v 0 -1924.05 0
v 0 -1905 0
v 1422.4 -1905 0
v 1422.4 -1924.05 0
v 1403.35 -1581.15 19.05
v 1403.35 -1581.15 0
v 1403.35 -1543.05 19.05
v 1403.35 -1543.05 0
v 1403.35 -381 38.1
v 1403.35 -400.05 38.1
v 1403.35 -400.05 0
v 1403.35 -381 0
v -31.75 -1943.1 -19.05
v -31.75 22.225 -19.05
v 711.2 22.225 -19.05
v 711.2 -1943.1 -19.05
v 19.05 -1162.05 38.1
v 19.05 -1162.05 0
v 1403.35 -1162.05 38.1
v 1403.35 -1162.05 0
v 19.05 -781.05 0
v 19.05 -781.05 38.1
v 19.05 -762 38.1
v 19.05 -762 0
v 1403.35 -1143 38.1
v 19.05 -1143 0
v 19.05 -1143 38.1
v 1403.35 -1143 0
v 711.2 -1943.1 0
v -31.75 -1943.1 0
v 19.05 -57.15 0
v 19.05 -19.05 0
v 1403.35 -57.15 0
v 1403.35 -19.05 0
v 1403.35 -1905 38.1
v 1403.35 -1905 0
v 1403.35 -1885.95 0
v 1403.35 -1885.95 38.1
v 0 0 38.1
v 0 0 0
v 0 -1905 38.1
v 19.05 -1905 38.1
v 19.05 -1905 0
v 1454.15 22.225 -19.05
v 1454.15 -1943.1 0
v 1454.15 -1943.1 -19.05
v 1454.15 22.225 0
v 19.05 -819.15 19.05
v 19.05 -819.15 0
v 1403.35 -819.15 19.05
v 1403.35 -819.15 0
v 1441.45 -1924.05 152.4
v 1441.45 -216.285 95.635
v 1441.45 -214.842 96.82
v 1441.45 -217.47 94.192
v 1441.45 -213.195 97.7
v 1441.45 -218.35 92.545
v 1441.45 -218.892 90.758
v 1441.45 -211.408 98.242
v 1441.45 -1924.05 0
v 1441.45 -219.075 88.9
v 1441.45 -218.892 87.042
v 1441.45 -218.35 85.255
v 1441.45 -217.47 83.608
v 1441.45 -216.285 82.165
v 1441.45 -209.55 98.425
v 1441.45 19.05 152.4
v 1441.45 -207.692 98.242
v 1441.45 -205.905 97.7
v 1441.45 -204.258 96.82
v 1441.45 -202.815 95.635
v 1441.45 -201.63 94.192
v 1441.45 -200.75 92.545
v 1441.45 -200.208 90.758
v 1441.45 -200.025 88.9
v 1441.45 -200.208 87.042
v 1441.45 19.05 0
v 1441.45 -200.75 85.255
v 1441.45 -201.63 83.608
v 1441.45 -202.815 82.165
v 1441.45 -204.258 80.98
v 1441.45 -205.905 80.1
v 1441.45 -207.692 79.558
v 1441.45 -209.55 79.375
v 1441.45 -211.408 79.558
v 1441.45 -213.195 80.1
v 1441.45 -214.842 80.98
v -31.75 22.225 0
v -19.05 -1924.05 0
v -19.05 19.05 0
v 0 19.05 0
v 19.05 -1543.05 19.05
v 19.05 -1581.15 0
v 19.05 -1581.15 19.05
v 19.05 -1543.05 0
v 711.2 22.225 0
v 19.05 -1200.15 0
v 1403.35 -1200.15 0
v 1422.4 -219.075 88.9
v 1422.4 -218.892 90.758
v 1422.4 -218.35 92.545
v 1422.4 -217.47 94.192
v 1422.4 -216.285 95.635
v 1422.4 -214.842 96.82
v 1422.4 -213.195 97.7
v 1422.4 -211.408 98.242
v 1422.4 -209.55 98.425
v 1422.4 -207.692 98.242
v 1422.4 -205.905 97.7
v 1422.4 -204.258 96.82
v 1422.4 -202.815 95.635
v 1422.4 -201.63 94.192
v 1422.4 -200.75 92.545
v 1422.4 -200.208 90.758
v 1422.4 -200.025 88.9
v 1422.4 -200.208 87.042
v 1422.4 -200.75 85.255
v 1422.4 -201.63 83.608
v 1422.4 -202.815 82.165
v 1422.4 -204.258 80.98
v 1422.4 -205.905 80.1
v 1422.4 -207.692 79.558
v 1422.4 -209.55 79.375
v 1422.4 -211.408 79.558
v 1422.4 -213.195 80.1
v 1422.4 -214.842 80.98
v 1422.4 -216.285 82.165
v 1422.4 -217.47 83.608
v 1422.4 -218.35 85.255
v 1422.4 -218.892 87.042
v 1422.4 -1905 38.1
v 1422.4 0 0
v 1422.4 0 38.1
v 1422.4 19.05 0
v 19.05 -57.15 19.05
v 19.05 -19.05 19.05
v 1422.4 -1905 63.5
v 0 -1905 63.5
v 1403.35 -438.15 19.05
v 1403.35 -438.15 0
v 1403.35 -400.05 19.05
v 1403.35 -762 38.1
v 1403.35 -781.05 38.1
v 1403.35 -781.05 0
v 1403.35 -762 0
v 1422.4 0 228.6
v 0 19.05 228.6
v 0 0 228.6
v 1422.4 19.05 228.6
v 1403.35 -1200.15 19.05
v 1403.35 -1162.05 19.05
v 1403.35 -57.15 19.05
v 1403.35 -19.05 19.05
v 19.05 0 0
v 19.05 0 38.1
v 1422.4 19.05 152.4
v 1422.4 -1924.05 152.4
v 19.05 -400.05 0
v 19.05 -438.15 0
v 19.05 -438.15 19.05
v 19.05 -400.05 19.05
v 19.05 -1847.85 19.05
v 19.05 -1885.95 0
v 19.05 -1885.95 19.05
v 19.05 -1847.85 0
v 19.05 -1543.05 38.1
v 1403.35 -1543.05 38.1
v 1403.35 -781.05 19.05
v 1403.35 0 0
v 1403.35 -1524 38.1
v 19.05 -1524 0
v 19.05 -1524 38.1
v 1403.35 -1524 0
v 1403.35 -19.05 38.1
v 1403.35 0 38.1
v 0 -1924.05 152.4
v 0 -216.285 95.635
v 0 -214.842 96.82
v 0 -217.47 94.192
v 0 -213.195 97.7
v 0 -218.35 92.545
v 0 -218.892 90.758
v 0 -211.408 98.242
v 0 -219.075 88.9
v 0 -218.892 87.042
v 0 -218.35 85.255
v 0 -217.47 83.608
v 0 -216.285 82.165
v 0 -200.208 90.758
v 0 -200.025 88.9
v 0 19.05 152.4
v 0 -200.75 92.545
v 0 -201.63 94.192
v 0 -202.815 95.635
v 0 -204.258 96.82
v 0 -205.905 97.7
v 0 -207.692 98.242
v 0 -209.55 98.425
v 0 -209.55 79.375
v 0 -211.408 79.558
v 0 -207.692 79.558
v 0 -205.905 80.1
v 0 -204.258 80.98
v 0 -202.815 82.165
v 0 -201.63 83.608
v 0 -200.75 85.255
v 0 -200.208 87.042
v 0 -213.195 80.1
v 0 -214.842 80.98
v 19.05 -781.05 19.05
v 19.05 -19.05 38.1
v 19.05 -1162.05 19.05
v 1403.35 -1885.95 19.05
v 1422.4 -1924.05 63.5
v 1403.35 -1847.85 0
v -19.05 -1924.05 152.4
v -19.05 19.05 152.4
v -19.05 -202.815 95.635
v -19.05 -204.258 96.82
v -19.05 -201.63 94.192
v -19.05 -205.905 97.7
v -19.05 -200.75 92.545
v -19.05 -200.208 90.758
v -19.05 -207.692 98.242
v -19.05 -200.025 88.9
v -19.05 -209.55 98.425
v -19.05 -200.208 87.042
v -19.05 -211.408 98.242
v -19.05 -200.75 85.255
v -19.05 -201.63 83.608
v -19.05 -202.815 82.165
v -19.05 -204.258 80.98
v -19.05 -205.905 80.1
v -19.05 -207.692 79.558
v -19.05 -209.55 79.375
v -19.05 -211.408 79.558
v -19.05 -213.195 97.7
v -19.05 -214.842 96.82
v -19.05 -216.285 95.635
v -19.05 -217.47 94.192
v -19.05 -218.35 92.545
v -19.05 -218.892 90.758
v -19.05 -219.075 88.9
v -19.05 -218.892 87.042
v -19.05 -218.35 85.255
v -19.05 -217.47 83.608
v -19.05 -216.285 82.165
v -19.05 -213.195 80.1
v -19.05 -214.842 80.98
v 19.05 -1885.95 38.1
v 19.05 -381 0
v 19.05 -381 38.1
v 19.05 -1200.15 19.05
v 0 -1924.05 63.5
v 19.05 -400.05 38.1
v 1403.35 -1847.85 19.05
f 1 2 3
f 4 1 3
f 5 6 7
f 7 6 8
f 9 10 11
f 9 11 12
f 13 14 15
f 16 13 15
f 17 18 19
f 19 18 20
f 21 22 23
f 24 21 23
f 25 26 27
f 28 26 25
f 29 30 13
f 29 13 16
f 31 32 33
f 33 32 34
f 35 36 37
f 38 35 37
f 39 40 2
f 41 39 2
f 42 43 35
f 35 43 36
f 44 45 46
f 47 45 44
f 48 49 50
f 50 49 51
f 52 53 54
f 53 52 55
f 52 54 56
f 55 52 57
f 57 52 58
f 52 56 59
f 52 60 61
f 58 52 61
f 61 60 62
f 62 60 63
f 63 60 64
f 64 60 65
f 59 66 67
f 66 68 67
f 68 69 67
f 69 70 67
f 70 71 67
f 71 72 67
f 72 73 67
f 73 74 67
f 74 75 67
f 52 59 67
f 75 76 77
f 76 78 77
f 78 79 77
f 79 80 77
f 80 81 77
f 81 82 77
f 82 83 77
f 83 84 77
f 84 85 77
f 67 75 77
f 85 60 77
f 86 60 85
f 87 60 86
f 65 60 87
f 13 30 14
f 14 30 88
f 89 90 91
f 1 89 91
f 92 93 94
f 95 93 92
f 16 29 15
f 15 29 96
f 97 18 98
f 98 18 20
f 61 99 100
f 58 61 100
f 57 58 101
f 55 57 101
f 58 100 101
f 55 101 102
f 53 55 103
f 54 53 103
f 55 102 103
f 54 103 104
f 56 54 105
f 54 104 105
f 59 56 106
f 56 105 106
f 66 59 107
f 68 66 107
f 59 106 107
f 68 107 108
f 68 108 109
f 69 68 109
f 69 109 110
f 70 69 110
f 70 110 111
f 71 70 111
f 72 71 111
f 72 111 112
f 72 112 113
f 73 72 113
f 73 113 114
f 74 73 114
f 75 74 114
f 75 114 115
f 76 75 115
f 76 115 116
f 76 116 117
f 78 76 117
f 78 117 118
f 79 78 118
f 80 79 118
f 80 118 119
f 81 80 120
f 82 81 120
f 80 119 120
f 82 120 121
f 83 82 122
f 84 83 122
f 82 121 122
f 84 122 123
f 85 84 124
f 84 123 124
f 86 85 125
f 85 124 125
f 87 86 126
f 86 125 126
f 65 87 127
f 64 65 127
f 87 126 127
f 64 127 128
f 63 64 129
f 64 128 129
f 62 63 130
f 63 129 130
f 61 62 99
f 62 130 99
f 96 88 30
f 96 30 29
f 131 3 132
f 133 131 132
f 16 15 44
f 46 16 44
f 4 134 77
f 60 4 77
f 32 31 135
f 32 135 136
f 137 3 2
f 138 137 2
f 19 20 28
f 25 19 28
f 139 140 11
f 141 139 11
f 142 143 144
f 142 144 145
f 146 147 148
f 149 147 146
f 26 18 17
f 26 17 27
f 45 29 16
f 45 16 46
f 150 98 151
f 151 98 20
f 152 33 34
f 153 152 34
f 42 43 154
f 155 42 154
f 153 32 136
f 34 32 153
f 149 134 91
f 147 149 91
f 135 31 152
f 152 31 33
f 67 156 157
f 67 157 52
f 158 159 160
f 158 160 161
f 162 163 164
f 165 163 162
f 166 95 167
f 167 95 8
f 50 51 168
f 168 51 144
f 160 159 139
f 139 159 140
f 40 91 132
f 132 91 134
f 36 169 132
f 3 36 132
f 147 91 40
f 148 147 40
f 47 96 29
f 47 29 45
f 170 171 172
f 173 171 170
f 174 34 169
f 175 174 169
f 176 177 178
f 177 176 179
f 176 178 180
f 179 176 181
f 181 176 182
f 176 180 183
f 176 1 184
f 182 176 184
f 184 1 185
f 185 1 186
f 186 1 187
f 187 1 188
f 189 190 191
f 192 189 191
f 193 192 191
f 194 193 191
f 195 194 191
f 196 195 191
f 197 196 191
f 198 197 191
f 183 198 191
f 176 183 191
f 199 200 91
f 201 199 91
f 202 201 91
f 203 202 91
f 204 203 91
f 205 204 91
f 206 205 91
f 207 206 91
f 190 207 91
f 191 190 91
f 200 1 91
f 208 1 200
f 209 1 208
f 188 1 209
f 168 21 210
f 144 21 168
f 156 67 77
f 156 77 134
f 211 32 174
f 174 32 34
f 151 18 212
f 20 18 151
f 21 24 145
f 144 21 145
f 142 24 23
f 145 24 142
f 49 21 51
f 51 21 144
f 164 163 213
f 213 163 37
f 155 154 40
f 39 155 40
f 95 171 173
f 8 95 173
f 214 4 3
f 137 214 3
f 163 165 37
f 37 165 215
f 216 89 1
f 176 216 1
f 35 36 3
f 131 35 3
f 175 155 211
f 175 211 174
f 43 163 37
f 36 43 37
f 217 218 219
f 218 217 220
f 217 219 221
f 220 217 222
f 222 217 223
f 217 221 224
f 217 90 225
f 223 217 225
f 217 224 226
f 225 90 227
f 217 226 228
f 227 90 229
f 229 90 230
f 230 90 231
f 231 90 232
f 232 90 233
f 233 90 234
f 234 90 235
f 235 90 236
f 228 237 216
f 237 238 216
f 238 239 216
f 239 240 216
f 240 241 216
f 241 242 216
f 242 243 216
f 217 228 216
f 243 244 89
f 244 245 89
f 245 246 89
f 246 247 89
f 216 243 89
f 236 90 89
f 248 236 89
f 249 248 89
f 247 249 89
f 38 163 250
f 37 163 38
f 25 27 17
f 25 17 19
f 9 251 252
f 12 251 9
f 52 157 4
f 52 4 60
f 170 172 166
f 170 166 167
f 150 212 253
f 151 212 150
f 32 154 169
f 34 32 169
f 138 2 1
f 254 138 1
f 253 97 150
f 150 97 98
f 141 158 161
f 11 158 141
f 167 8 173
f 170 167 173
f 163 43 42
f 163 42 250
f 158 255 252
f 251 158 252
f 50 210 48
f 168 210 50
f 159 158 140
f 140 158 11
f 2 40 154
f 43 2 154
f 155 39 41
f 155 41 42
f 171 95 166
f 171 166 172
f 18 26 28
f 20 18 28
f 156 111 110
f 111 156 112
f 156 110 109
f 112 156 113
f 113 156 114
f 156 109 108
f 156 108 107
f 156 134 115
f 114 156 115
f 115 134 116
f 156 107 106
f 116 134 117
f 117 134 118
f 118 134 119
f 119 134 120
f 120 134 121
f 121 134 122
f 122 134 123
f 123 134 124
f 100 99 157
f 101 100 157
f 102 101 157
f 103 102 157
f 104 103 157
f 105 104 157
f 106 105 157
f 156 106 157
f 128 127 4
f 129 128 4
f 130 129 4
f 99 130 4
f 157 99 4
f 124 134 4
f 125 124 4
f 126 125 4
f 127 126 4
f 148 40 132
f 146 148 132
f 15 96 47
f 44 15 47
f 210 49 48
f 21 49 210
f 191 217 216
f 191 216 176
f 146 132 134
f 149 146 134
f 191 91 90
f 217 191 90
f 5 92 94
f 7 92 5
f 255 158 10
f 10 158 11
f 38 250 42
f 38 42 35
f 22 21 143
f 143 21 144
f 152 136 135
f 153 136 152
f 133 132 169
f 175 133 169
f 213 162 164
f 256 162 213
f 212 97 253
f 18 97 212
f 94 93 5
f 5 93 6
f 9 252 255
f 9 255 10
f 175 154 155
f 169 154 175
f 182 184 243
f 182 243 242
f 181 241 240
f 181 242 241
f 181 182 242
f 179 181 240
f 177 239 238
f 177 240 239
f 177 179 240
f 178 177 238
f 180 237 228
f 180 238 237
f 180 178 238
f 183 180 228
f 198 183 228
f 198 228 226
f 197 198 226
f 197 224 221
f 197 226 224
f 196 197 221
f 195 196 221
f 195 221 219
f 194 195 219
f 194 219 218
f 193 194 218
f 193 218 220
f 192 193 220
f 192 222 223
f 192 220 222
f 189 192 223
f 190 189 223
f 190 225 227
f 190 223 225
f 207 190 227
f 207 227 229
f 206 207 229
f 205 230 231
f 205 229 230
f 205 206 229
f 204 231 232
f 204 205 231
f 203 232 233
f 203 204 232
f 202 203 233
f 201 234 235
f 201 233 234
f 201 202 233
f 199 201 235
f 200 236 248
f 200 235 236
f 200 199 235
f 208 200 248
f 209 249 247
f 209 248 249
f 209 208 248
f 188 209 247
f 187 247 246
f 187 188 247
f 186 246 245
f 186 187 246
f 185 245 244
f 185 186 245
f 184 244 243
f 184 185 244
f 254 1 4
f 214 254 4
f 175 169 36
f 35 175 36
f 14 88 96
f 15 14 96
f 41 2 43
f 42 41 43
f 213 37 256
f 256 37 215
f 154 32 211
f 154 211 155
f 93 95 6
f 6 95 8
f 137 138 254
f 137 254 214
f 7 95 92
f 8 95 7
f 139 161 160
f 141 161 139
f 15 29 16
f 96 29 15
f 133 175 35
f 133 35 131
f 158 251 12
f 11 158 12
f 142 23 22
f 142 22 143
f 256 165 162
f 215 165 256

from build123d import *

# Parameters (mm, degrees)
F0_W           = 1384.3
F0_H           = 19.05
F1_DEPTH       = 38.1
F2_DEPTH       = 38.1
F0_H_2         = 38.1
F3_DEPTH       = 19.05
F4_DEPTH       = 228.6
F5_DEPTH       = 63.5
F6_DEPTH       = 152.4
F7_W           = 742.95
F7_H           = 1965.325
F8_DEPTH       = 19.05
F9_DEPTH       = 19.05
F10_R          = 9.525
F11_DEPTH      = 31.751
F11_DEPTH_BACK = 1454.151


with BuildPart() as f1:
    # F0 (on Top) → F1 (new body)
    with BuildSketch(Plane.XY):
        with Locations((711.2, -9.525)):
            Rectangle(F0_W, F0_H)
    extrude(amount=F1_DEPTH)


with BuildPart() as f1b:
    # F0 (on Top) → F1, piece 2 (new body)
    with BuildSketch(Plane.XY):
        with Locations((711.2, -390.525)):
            Rectangle(F0_W, F0_H)
    extrude(amount=F1_DEPTH)


with BuildPart() as f1c:
    # F0 (on Top) → F1, piece 3 (new body)
    with BuildSketch(Plane.XY):
        with Locations((711.2, -771.525)):
            Rectangle(F0_W, F0_H)
    extrude(amount=F1_DEPTH)


with BuildPart() as f1d:
    # F0 (on Top) → F1, piece 4 (new body)
    with BuildSketch(Plane.XY):
        with Locations((711.2, -1152.525)):
            Rectangle(F0_W, F0_H)
    extrude(amount=F1_DEPTH)


with BuildPart() as f1e:
    # F0 (on Top) → F1, piece 5 (new body)
    with BuildSketch(Plane.XY):
        with Locations((711.2, -1533.525)):
            Rectangle(F0_W, F0_H)
    extrude(amount=F1_DEPTH)


with BuildPart() as f1f:
    # F0 (on Top) → F1, piece 6 (new body)
    with BuildSketch(Plane.XY):
        with Locations((711.2, -1895.475)):
            Rectangle(F0_W, F0_H)
    extrude(amount=F1_DEPTH)


with BuildPart() as f2:
    # F0 (on Top) → F2 (new body)
    with BuildSketch(Plane.XY):
        Polygon((19.05, -19.05), (19.05, 0), (0, 0), (0, -1905), (19.05, -1905), (19.05, -1885.95), (19.05, -1847.85), (19.05, -1581.15), (19.05, -1543.05), (19.05, -1524), (19.05, -1200.15), (19.05, -1162.05), (19.05, -1143), (19.05, -819.15), (19.05, -781.05), (19.05, -762), (19.05, -438.15), (19.05, -400.05), (19.05, -381), (19.05, -57.15), align=None)
    extrude(amount=F2_DEPTH)


with BuildPart() as f2b:
    # F0 (on Top) → F2, piece 2 (new body)
    with BuildSketch(Plane.XY):
        Polygon((1422.4, 0), (1403.35, 0), (1403.35, -19.05), (1403.35, -57.15), (1403.35, -381), (1403.35, -400.05), (1403.35, -438.15), (1403.35, -762), (1403.35, -781.05), (1403.35, -819.15), (1403.35, -1143), (1403.35, -1162.05), (1403.35, -1200.15), (1403.35, -1524), (1403.35, -1543.05), (1403.35, -1581.15), (1403.35, -1847.85), (1403.35, -1885.95), (1403.35, -1905), (1422.4, -1905), align=None)
    extrude(amount=F2_DEPTH)


with BuildPart() as f3:
    # F0 (on Top) → F3 (new body)
    with BuildSketch(Plane.XY):
        with Locations((711.2, -38.1)):
            Rectangle(F0_W, F0_H_2)
    extrude(amount=F3_DEPTH)


with BuildPart() as f3b:
    # F0 (on Top) → F3, piece 2 (new body)
    with BuildSketch(Plane.XY):
        with Locations((711.2, -419.1)):
            Rectangle(F0_W, F0_H_2)
    extrude(amount=F3_DEPTH)


with BuildPart() as f3c:
    # F0 (on Top) → F3, piece 3 (new body)
    with BuildSketch(Plane.XY):
        with Locations((711.2, -800.1)):
            Rectangle(F0_W, F0_H_2)
    extrude(amount=F3_DEPTH)


with BuildPart() as f3d:
    # F0 (on Top) → F3, piece 4 (new body)
    with BuildSketch(Plane.XY):
        with Locations((711.2, -1181.1)):
            Rectangle(F0_W, F0_H_2)
    extrude(amount=F3_DEPTH)


with BuildPart() as f3e:
    # F0 (on Top) → F3, piece 5 (new body)
    with BuildSketch(Plane.XY):
        with Locations((711.2, -1562.1)):
            Rectangle(F0_W, F0_H_2)
    extrude(amount=F3_DEPTH)


with BuildPart() as f3f:
    # F0 (on Top) → F3, piece 6 (new body)
    with BuildSketch(Plane.XY):
        with Locations((711.2, -1866.9)):
            Rectangle(F0_W, F0_H_2)
    extrude(amount=F3_DEPTH)


with BuildPart() as f4:
    # F0 (on Top) → F4 (new body)
    with BuildSketch(Plane.XY):
        Polygon((0, 0), (19.05, 0), (1403.35, 0), (1422.4, 0), (1422.4, 19.05), (0, 19.05), align=None)
    extrude(amount=F4_DEPTH)


with BuildPart() as f5:
    # F0 (on Top) → F5 (new body)
    with BuildSketch(Plane.XY):
        Polygon((19.05, -1905), (0, -1905), (0, -1924.05), (1422.4, -1924.05), (1422.4, -1905), (1403.35, -1905), align=None)
    extrude(amount=F5_DEPTH)


with BuildPart() as f6:
    # F0 (on Top) → F6 (new body)
    with BuildSketch(Plane.XY):
        Polygon((1422.4, 19.05), (1422.4, 0), (1422.4, -1905), (1422.4, -1924.05), (1441.45, -1924.05), (1441.45, 19.05), align=None)
    extrude(amount=F6_DEPTH)


with BuildPart() as f6b:
    # F0 (on Top) → F6, piece 2 (new body)
    with BuildSketch(Plane.XY):
        Polygon((0, -1905), (0, 0), (0, 19.05), (-19.05, 19.05), (-19.05, -1924.05), (0, -1924.05), align=None)
    extrude(amount=F6_DEPTH)


with BuildPart() as f8:
    # F7 (on Top) → F8 (new body)
    with BuildSketch(Plane.XY):
        with Locations((339.725, -960.4375)):
            Rectangle(F7_W, F7_H)
    extrude(amount=-F8_DEPTH)


with BuildPart() as f9:
    # F7 (on Top) → F9 (new body)
    with BuildSketch(Plane.XY):
        with Locations((1082.675, -960.4375)):
            Rectangle(F7_W, F7_H)
    extrude(amount=-F9_DEPTH)


with BuildPart() as f11_tool:
    # F10 (on face) → F11 (new body, two sides)
    with BuildSketch(Plane(origin=(1422.4, 0, 0), x_dir=(0, -1, 0), z_dir=(-1, 0, 0))) as f11_sk:
        with Locations((209.55, 88.9)):
            Circle(F10_R)
    extrude(amount=-F11_DEPTH)
    extrude(f11_sk.sketch, amount=F11_DEPTH_BACK)


with BuildPart() as f6_1:
    add(f6.part)

    # F11: cut by f11_tool
    add(f11_tool.part, mode=Mode.SUBTRACT)


with BuildPart() as f6b_1:
    add(f6b.part)

    # F11: cut by f11_tool
    add(f11_tool.part, mode=Mode.SUBTRACT)


solid = Compound([f1.part, f1b.part, f1c.part, f1d.part, f1e.part, f1f.part, f2.part, f2b.part, f3.part, f3b.part, f3c.part, f3d.part, f3e.part, f3f.part, f4.part, f5.part, f8.part, f9.part, f6_1.part, f6b_1.part])
